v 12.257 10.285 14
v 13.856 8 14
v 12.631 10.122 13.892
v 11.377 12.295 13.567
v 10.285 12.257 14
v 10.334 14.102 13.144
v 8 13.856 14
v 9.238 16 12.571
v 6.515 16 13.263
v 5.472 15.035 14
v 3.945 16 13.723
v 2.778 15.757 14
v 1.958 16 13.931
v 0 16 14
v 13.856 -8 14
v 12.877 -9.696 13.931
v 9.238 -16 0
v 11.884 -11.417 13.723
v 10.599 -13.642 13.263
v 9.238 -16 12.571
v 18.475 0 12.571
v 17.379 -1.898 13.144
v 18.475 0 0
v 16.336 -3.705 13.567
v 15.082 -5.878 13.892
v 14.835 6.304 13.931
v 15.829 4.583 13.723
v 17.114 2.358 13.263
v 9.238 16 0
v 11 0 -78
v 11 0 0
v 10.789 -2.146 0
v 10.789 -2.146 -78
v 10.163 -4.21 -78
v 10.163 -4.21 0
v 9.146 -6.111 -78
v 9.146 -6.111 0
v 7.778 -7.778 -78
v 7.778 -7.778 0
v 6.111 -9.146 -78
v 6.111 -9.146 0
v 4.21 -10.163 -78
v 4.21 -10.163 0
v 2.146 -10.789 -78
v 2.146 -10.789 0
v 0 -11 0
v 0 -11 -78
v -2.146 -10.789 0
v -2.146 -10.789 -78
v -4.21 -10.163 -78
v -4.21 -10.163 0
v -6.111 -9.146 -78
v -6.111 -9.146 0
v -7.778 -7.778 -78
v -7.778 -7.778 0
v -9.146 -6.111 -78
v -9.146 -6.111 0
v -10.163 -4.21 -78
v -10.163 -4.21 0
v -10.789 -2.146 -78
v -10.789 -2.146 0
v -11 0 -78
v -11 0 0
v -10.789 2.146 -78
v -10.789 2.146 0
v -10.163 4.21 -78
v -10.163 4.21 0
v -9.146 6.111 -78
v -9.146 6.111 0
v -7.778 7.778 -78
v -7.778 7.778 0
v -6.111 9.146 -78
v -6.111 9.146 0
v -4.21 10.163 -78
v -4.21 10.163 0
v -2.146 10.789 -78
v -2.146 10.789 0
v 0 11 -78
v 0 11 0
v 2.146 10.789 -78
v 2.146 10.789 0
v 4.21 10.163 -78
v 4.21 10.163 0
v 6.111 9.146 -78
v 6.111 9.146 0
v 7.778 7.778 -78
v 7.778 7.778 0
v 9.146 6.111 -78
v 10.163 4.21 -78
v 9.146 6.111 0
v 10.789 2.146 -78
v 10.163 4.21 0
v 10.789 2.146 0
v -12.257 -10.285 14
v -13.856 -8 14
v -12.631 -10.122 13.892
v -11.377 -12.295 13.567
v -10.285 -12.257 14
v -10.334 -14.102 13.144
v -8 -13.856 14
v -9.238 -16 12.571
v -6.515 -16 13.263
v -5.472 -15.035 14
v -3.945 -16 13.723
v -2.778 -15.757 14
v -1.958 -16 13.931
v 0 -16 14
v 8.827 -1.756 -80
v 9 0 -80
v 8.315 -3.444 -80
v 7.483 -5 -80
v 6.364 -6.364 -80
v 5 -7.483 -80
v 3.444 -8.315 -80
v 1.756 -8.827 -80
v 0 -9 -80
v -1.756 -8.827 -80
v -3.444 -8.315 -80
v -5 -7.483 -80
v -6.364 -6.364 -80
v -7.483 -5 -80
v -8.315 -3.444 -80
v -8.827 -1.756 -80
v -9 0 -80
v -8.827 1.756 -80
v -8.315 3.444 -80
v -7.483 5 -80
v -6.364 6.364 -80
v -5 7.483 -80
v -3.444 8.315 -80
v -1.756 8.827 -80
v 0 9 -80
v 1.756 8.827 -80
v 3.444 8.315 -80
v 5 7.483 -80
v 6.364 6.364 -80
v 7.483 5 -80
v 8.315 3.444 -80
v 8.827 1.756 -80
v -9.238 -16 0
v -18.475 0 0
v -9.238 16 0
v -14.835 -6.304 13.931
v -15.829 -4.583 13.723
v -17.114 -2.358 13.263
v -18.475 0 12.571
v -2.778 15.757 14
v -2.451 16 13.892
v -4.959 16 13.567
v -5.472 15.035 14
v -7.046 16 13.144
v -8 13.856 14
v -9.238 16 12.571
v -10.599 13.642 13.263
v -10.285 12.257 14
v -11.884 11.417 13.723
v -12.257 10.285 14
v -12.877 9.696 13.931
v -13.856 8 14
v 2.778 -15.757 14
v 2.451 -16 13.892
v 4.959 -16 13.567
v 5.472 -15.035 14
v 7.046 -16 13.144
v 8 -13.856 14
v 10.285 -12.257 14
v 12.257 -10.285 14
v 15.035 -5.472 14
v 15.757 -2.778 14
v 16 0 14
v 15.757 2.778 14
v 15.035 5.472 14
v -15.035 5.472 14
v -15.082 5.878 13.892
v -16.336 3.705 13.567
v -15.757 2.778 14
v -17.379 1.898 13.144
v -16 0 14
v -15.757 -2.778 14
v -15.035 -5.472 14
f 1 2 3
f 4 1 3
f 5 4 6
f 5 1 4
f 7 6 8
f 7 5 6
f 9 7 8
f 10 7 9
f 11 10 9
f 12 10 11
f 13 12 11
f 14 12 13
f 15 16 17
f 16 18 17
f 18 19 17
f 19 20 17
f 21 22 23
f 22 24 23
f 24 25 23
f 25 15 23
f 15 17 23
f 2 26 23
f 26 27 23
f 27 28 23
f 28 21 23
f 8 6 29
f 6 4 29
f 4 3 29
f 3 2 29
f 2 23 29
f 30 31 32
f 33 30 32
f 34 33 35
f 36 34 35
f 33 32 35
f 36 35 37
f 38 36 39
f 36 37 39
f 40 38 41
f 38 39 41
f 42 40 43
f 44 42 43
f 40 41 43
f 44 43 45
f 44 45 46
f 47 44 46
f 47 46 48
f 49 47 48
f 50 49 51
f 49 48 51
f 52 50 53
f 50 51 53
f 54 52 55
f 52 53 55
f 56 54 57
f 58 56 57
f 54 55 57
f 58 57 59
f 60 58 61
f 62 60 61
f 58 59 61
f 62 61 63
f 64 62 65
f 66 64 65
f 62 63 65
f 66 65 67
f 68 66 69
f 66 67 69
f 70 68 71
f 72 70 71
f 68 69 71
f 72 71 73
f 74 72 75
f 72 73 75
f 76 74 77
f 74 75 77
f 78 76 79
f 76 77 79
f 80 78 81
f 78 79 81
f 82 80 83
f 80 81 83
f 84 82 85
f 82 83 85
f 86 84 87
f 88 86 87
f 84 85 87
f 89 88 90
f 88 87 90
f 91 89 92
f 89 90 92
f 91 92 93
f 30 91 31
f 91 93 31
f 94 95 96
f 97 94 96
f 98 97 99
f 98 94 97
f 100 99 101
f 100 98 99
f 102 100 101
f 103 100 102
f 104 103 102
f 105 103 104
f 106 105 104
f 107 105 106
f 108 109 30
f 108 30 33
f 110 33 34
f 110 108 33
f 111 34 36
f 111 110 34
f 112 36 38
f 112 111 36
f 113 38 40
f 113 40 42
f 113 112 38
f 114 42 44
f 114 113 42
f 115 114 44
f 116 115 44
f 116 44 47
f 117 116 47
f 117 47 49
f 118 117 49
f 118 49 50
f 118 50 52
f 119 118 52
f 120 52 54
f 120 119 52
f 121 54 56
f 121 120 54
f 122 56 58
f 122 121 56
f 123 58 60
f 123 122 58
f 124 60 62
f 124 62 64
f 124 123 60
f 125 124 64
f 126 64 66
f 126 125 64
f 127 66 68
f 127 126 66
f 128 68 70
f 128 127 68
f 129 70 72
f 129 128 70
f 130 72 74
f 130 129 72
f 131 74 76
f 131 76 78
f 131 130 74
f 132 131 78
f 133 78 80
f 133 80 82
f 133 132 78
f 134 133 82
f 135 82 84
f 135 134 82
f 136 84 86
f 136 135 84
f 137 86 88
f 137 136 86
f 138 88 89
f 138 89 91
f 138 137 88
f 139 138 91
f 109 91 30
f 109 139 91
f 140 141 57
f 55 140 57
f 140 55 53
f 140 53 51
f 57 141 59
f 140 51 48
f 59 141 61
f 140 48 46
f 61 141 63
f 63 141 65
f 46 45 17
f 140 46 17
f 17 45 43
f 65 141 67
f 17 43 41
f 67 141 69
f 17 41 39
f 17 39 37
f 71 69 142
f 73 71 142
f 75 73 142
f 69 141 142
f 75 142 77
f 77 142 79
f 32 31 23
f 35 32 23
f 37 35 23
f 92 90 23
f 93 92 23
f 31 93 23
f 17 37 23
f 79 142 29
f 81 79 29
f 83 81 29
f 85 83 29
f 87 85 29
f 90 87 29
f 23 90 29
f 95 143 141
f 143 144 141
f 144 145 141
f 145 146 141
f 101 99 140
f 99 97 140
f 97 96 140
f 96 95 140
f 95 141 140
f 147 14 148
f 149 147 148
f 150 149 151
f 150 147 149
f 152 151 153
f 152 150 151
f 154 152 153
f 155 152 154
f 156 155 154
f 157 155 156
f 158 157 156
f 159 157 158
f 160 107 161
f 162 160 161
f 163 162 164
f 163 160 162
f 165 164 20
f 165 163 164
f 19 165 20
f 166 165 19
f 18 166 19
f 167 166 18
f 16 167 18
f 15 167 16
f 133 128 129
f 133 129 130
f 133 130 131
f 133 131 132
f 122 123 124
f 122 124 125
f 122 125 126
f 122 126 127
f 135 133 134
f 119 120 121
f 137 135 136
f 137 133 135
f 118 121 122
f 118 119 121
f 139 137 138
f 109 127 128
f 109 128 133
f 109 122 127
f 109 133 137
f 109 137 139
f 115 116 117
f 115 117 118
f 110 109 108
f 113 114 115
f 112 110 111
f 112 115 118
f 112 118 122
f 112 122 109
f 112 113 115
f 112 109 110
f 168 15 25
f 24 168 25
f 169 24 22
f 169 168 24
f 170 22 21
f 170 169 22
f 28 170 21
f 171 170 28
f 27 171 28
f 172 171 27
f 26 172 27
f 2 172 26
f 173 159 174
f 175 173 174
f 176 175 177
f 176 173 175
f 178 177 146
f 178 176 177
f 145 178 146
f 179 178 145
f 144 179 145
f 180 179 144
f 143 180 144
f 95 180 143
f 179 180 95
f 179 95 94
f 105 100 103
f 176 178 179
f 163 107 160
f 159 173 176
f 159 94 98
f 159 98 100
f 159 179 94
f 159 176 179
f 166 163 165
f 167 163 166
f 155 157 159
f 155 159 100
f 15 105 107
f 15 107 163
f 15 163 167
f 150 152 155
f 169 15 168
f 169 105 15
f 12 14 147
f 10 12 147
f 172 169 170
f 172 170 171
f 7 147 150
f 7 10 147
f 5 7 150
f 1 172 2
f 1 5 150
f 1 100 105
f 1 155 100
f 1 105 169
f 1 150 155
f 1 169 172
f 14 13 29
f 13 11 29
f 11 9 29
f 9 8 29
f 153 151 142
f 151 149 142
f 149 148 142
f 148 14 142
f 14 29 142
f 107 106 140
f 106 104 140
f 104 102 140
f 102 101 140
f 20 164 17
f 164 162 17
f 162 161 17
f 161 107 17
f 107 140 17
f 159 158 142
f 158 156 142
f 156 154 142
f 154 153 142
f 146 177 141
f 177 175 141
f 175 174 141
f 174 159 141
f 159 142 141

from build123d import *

# Parameters (mm, degrees)
F1_DEPTH = 14
F4_R     = 11
F5_DEPTH = 80
F6_SIZE  = 2


with BuildPart() as f1:
    # F0 (on Top) → F1 (new body)
    with BuildSketch(Plane.XY):
        Polygon((18.475209, 0), (9.237604, 16), (-9.237604, 16), (-18.475209, 0), (-9.237604, -16), (9.237604, -16), align=None)
    extrude(amount=F1_DEPTH)

    # F2 (on Right) → F3 (revolve, cut)
    with BuildSketch(Plane.YZ):
        Polygon((-29.047782, 6.46686), (-16, 14), (-29.047782, 14), align=None)
    revolve(axis=Axis((0, 0, 10.077371), (0, 0, 1)), mode=Mode.SUBTRACT)

    # F4 (on face) → F5 (join)
    with BuildSketch(Plane(origin=(0, 0, 0), x_dir=(1, 0, 0), z_dir=(0, 0, -1))):
        Circle(F4_R)
    extrude(amount=F5_DEPTH)

    # F6
    f6_edges = [f1.edges().sort_by_distance(p)[0] for p in [
        (-11, 0, -80),
    ]]
    chamfer(f6_edges, length=F6_SIZE)


solid = f1.part
